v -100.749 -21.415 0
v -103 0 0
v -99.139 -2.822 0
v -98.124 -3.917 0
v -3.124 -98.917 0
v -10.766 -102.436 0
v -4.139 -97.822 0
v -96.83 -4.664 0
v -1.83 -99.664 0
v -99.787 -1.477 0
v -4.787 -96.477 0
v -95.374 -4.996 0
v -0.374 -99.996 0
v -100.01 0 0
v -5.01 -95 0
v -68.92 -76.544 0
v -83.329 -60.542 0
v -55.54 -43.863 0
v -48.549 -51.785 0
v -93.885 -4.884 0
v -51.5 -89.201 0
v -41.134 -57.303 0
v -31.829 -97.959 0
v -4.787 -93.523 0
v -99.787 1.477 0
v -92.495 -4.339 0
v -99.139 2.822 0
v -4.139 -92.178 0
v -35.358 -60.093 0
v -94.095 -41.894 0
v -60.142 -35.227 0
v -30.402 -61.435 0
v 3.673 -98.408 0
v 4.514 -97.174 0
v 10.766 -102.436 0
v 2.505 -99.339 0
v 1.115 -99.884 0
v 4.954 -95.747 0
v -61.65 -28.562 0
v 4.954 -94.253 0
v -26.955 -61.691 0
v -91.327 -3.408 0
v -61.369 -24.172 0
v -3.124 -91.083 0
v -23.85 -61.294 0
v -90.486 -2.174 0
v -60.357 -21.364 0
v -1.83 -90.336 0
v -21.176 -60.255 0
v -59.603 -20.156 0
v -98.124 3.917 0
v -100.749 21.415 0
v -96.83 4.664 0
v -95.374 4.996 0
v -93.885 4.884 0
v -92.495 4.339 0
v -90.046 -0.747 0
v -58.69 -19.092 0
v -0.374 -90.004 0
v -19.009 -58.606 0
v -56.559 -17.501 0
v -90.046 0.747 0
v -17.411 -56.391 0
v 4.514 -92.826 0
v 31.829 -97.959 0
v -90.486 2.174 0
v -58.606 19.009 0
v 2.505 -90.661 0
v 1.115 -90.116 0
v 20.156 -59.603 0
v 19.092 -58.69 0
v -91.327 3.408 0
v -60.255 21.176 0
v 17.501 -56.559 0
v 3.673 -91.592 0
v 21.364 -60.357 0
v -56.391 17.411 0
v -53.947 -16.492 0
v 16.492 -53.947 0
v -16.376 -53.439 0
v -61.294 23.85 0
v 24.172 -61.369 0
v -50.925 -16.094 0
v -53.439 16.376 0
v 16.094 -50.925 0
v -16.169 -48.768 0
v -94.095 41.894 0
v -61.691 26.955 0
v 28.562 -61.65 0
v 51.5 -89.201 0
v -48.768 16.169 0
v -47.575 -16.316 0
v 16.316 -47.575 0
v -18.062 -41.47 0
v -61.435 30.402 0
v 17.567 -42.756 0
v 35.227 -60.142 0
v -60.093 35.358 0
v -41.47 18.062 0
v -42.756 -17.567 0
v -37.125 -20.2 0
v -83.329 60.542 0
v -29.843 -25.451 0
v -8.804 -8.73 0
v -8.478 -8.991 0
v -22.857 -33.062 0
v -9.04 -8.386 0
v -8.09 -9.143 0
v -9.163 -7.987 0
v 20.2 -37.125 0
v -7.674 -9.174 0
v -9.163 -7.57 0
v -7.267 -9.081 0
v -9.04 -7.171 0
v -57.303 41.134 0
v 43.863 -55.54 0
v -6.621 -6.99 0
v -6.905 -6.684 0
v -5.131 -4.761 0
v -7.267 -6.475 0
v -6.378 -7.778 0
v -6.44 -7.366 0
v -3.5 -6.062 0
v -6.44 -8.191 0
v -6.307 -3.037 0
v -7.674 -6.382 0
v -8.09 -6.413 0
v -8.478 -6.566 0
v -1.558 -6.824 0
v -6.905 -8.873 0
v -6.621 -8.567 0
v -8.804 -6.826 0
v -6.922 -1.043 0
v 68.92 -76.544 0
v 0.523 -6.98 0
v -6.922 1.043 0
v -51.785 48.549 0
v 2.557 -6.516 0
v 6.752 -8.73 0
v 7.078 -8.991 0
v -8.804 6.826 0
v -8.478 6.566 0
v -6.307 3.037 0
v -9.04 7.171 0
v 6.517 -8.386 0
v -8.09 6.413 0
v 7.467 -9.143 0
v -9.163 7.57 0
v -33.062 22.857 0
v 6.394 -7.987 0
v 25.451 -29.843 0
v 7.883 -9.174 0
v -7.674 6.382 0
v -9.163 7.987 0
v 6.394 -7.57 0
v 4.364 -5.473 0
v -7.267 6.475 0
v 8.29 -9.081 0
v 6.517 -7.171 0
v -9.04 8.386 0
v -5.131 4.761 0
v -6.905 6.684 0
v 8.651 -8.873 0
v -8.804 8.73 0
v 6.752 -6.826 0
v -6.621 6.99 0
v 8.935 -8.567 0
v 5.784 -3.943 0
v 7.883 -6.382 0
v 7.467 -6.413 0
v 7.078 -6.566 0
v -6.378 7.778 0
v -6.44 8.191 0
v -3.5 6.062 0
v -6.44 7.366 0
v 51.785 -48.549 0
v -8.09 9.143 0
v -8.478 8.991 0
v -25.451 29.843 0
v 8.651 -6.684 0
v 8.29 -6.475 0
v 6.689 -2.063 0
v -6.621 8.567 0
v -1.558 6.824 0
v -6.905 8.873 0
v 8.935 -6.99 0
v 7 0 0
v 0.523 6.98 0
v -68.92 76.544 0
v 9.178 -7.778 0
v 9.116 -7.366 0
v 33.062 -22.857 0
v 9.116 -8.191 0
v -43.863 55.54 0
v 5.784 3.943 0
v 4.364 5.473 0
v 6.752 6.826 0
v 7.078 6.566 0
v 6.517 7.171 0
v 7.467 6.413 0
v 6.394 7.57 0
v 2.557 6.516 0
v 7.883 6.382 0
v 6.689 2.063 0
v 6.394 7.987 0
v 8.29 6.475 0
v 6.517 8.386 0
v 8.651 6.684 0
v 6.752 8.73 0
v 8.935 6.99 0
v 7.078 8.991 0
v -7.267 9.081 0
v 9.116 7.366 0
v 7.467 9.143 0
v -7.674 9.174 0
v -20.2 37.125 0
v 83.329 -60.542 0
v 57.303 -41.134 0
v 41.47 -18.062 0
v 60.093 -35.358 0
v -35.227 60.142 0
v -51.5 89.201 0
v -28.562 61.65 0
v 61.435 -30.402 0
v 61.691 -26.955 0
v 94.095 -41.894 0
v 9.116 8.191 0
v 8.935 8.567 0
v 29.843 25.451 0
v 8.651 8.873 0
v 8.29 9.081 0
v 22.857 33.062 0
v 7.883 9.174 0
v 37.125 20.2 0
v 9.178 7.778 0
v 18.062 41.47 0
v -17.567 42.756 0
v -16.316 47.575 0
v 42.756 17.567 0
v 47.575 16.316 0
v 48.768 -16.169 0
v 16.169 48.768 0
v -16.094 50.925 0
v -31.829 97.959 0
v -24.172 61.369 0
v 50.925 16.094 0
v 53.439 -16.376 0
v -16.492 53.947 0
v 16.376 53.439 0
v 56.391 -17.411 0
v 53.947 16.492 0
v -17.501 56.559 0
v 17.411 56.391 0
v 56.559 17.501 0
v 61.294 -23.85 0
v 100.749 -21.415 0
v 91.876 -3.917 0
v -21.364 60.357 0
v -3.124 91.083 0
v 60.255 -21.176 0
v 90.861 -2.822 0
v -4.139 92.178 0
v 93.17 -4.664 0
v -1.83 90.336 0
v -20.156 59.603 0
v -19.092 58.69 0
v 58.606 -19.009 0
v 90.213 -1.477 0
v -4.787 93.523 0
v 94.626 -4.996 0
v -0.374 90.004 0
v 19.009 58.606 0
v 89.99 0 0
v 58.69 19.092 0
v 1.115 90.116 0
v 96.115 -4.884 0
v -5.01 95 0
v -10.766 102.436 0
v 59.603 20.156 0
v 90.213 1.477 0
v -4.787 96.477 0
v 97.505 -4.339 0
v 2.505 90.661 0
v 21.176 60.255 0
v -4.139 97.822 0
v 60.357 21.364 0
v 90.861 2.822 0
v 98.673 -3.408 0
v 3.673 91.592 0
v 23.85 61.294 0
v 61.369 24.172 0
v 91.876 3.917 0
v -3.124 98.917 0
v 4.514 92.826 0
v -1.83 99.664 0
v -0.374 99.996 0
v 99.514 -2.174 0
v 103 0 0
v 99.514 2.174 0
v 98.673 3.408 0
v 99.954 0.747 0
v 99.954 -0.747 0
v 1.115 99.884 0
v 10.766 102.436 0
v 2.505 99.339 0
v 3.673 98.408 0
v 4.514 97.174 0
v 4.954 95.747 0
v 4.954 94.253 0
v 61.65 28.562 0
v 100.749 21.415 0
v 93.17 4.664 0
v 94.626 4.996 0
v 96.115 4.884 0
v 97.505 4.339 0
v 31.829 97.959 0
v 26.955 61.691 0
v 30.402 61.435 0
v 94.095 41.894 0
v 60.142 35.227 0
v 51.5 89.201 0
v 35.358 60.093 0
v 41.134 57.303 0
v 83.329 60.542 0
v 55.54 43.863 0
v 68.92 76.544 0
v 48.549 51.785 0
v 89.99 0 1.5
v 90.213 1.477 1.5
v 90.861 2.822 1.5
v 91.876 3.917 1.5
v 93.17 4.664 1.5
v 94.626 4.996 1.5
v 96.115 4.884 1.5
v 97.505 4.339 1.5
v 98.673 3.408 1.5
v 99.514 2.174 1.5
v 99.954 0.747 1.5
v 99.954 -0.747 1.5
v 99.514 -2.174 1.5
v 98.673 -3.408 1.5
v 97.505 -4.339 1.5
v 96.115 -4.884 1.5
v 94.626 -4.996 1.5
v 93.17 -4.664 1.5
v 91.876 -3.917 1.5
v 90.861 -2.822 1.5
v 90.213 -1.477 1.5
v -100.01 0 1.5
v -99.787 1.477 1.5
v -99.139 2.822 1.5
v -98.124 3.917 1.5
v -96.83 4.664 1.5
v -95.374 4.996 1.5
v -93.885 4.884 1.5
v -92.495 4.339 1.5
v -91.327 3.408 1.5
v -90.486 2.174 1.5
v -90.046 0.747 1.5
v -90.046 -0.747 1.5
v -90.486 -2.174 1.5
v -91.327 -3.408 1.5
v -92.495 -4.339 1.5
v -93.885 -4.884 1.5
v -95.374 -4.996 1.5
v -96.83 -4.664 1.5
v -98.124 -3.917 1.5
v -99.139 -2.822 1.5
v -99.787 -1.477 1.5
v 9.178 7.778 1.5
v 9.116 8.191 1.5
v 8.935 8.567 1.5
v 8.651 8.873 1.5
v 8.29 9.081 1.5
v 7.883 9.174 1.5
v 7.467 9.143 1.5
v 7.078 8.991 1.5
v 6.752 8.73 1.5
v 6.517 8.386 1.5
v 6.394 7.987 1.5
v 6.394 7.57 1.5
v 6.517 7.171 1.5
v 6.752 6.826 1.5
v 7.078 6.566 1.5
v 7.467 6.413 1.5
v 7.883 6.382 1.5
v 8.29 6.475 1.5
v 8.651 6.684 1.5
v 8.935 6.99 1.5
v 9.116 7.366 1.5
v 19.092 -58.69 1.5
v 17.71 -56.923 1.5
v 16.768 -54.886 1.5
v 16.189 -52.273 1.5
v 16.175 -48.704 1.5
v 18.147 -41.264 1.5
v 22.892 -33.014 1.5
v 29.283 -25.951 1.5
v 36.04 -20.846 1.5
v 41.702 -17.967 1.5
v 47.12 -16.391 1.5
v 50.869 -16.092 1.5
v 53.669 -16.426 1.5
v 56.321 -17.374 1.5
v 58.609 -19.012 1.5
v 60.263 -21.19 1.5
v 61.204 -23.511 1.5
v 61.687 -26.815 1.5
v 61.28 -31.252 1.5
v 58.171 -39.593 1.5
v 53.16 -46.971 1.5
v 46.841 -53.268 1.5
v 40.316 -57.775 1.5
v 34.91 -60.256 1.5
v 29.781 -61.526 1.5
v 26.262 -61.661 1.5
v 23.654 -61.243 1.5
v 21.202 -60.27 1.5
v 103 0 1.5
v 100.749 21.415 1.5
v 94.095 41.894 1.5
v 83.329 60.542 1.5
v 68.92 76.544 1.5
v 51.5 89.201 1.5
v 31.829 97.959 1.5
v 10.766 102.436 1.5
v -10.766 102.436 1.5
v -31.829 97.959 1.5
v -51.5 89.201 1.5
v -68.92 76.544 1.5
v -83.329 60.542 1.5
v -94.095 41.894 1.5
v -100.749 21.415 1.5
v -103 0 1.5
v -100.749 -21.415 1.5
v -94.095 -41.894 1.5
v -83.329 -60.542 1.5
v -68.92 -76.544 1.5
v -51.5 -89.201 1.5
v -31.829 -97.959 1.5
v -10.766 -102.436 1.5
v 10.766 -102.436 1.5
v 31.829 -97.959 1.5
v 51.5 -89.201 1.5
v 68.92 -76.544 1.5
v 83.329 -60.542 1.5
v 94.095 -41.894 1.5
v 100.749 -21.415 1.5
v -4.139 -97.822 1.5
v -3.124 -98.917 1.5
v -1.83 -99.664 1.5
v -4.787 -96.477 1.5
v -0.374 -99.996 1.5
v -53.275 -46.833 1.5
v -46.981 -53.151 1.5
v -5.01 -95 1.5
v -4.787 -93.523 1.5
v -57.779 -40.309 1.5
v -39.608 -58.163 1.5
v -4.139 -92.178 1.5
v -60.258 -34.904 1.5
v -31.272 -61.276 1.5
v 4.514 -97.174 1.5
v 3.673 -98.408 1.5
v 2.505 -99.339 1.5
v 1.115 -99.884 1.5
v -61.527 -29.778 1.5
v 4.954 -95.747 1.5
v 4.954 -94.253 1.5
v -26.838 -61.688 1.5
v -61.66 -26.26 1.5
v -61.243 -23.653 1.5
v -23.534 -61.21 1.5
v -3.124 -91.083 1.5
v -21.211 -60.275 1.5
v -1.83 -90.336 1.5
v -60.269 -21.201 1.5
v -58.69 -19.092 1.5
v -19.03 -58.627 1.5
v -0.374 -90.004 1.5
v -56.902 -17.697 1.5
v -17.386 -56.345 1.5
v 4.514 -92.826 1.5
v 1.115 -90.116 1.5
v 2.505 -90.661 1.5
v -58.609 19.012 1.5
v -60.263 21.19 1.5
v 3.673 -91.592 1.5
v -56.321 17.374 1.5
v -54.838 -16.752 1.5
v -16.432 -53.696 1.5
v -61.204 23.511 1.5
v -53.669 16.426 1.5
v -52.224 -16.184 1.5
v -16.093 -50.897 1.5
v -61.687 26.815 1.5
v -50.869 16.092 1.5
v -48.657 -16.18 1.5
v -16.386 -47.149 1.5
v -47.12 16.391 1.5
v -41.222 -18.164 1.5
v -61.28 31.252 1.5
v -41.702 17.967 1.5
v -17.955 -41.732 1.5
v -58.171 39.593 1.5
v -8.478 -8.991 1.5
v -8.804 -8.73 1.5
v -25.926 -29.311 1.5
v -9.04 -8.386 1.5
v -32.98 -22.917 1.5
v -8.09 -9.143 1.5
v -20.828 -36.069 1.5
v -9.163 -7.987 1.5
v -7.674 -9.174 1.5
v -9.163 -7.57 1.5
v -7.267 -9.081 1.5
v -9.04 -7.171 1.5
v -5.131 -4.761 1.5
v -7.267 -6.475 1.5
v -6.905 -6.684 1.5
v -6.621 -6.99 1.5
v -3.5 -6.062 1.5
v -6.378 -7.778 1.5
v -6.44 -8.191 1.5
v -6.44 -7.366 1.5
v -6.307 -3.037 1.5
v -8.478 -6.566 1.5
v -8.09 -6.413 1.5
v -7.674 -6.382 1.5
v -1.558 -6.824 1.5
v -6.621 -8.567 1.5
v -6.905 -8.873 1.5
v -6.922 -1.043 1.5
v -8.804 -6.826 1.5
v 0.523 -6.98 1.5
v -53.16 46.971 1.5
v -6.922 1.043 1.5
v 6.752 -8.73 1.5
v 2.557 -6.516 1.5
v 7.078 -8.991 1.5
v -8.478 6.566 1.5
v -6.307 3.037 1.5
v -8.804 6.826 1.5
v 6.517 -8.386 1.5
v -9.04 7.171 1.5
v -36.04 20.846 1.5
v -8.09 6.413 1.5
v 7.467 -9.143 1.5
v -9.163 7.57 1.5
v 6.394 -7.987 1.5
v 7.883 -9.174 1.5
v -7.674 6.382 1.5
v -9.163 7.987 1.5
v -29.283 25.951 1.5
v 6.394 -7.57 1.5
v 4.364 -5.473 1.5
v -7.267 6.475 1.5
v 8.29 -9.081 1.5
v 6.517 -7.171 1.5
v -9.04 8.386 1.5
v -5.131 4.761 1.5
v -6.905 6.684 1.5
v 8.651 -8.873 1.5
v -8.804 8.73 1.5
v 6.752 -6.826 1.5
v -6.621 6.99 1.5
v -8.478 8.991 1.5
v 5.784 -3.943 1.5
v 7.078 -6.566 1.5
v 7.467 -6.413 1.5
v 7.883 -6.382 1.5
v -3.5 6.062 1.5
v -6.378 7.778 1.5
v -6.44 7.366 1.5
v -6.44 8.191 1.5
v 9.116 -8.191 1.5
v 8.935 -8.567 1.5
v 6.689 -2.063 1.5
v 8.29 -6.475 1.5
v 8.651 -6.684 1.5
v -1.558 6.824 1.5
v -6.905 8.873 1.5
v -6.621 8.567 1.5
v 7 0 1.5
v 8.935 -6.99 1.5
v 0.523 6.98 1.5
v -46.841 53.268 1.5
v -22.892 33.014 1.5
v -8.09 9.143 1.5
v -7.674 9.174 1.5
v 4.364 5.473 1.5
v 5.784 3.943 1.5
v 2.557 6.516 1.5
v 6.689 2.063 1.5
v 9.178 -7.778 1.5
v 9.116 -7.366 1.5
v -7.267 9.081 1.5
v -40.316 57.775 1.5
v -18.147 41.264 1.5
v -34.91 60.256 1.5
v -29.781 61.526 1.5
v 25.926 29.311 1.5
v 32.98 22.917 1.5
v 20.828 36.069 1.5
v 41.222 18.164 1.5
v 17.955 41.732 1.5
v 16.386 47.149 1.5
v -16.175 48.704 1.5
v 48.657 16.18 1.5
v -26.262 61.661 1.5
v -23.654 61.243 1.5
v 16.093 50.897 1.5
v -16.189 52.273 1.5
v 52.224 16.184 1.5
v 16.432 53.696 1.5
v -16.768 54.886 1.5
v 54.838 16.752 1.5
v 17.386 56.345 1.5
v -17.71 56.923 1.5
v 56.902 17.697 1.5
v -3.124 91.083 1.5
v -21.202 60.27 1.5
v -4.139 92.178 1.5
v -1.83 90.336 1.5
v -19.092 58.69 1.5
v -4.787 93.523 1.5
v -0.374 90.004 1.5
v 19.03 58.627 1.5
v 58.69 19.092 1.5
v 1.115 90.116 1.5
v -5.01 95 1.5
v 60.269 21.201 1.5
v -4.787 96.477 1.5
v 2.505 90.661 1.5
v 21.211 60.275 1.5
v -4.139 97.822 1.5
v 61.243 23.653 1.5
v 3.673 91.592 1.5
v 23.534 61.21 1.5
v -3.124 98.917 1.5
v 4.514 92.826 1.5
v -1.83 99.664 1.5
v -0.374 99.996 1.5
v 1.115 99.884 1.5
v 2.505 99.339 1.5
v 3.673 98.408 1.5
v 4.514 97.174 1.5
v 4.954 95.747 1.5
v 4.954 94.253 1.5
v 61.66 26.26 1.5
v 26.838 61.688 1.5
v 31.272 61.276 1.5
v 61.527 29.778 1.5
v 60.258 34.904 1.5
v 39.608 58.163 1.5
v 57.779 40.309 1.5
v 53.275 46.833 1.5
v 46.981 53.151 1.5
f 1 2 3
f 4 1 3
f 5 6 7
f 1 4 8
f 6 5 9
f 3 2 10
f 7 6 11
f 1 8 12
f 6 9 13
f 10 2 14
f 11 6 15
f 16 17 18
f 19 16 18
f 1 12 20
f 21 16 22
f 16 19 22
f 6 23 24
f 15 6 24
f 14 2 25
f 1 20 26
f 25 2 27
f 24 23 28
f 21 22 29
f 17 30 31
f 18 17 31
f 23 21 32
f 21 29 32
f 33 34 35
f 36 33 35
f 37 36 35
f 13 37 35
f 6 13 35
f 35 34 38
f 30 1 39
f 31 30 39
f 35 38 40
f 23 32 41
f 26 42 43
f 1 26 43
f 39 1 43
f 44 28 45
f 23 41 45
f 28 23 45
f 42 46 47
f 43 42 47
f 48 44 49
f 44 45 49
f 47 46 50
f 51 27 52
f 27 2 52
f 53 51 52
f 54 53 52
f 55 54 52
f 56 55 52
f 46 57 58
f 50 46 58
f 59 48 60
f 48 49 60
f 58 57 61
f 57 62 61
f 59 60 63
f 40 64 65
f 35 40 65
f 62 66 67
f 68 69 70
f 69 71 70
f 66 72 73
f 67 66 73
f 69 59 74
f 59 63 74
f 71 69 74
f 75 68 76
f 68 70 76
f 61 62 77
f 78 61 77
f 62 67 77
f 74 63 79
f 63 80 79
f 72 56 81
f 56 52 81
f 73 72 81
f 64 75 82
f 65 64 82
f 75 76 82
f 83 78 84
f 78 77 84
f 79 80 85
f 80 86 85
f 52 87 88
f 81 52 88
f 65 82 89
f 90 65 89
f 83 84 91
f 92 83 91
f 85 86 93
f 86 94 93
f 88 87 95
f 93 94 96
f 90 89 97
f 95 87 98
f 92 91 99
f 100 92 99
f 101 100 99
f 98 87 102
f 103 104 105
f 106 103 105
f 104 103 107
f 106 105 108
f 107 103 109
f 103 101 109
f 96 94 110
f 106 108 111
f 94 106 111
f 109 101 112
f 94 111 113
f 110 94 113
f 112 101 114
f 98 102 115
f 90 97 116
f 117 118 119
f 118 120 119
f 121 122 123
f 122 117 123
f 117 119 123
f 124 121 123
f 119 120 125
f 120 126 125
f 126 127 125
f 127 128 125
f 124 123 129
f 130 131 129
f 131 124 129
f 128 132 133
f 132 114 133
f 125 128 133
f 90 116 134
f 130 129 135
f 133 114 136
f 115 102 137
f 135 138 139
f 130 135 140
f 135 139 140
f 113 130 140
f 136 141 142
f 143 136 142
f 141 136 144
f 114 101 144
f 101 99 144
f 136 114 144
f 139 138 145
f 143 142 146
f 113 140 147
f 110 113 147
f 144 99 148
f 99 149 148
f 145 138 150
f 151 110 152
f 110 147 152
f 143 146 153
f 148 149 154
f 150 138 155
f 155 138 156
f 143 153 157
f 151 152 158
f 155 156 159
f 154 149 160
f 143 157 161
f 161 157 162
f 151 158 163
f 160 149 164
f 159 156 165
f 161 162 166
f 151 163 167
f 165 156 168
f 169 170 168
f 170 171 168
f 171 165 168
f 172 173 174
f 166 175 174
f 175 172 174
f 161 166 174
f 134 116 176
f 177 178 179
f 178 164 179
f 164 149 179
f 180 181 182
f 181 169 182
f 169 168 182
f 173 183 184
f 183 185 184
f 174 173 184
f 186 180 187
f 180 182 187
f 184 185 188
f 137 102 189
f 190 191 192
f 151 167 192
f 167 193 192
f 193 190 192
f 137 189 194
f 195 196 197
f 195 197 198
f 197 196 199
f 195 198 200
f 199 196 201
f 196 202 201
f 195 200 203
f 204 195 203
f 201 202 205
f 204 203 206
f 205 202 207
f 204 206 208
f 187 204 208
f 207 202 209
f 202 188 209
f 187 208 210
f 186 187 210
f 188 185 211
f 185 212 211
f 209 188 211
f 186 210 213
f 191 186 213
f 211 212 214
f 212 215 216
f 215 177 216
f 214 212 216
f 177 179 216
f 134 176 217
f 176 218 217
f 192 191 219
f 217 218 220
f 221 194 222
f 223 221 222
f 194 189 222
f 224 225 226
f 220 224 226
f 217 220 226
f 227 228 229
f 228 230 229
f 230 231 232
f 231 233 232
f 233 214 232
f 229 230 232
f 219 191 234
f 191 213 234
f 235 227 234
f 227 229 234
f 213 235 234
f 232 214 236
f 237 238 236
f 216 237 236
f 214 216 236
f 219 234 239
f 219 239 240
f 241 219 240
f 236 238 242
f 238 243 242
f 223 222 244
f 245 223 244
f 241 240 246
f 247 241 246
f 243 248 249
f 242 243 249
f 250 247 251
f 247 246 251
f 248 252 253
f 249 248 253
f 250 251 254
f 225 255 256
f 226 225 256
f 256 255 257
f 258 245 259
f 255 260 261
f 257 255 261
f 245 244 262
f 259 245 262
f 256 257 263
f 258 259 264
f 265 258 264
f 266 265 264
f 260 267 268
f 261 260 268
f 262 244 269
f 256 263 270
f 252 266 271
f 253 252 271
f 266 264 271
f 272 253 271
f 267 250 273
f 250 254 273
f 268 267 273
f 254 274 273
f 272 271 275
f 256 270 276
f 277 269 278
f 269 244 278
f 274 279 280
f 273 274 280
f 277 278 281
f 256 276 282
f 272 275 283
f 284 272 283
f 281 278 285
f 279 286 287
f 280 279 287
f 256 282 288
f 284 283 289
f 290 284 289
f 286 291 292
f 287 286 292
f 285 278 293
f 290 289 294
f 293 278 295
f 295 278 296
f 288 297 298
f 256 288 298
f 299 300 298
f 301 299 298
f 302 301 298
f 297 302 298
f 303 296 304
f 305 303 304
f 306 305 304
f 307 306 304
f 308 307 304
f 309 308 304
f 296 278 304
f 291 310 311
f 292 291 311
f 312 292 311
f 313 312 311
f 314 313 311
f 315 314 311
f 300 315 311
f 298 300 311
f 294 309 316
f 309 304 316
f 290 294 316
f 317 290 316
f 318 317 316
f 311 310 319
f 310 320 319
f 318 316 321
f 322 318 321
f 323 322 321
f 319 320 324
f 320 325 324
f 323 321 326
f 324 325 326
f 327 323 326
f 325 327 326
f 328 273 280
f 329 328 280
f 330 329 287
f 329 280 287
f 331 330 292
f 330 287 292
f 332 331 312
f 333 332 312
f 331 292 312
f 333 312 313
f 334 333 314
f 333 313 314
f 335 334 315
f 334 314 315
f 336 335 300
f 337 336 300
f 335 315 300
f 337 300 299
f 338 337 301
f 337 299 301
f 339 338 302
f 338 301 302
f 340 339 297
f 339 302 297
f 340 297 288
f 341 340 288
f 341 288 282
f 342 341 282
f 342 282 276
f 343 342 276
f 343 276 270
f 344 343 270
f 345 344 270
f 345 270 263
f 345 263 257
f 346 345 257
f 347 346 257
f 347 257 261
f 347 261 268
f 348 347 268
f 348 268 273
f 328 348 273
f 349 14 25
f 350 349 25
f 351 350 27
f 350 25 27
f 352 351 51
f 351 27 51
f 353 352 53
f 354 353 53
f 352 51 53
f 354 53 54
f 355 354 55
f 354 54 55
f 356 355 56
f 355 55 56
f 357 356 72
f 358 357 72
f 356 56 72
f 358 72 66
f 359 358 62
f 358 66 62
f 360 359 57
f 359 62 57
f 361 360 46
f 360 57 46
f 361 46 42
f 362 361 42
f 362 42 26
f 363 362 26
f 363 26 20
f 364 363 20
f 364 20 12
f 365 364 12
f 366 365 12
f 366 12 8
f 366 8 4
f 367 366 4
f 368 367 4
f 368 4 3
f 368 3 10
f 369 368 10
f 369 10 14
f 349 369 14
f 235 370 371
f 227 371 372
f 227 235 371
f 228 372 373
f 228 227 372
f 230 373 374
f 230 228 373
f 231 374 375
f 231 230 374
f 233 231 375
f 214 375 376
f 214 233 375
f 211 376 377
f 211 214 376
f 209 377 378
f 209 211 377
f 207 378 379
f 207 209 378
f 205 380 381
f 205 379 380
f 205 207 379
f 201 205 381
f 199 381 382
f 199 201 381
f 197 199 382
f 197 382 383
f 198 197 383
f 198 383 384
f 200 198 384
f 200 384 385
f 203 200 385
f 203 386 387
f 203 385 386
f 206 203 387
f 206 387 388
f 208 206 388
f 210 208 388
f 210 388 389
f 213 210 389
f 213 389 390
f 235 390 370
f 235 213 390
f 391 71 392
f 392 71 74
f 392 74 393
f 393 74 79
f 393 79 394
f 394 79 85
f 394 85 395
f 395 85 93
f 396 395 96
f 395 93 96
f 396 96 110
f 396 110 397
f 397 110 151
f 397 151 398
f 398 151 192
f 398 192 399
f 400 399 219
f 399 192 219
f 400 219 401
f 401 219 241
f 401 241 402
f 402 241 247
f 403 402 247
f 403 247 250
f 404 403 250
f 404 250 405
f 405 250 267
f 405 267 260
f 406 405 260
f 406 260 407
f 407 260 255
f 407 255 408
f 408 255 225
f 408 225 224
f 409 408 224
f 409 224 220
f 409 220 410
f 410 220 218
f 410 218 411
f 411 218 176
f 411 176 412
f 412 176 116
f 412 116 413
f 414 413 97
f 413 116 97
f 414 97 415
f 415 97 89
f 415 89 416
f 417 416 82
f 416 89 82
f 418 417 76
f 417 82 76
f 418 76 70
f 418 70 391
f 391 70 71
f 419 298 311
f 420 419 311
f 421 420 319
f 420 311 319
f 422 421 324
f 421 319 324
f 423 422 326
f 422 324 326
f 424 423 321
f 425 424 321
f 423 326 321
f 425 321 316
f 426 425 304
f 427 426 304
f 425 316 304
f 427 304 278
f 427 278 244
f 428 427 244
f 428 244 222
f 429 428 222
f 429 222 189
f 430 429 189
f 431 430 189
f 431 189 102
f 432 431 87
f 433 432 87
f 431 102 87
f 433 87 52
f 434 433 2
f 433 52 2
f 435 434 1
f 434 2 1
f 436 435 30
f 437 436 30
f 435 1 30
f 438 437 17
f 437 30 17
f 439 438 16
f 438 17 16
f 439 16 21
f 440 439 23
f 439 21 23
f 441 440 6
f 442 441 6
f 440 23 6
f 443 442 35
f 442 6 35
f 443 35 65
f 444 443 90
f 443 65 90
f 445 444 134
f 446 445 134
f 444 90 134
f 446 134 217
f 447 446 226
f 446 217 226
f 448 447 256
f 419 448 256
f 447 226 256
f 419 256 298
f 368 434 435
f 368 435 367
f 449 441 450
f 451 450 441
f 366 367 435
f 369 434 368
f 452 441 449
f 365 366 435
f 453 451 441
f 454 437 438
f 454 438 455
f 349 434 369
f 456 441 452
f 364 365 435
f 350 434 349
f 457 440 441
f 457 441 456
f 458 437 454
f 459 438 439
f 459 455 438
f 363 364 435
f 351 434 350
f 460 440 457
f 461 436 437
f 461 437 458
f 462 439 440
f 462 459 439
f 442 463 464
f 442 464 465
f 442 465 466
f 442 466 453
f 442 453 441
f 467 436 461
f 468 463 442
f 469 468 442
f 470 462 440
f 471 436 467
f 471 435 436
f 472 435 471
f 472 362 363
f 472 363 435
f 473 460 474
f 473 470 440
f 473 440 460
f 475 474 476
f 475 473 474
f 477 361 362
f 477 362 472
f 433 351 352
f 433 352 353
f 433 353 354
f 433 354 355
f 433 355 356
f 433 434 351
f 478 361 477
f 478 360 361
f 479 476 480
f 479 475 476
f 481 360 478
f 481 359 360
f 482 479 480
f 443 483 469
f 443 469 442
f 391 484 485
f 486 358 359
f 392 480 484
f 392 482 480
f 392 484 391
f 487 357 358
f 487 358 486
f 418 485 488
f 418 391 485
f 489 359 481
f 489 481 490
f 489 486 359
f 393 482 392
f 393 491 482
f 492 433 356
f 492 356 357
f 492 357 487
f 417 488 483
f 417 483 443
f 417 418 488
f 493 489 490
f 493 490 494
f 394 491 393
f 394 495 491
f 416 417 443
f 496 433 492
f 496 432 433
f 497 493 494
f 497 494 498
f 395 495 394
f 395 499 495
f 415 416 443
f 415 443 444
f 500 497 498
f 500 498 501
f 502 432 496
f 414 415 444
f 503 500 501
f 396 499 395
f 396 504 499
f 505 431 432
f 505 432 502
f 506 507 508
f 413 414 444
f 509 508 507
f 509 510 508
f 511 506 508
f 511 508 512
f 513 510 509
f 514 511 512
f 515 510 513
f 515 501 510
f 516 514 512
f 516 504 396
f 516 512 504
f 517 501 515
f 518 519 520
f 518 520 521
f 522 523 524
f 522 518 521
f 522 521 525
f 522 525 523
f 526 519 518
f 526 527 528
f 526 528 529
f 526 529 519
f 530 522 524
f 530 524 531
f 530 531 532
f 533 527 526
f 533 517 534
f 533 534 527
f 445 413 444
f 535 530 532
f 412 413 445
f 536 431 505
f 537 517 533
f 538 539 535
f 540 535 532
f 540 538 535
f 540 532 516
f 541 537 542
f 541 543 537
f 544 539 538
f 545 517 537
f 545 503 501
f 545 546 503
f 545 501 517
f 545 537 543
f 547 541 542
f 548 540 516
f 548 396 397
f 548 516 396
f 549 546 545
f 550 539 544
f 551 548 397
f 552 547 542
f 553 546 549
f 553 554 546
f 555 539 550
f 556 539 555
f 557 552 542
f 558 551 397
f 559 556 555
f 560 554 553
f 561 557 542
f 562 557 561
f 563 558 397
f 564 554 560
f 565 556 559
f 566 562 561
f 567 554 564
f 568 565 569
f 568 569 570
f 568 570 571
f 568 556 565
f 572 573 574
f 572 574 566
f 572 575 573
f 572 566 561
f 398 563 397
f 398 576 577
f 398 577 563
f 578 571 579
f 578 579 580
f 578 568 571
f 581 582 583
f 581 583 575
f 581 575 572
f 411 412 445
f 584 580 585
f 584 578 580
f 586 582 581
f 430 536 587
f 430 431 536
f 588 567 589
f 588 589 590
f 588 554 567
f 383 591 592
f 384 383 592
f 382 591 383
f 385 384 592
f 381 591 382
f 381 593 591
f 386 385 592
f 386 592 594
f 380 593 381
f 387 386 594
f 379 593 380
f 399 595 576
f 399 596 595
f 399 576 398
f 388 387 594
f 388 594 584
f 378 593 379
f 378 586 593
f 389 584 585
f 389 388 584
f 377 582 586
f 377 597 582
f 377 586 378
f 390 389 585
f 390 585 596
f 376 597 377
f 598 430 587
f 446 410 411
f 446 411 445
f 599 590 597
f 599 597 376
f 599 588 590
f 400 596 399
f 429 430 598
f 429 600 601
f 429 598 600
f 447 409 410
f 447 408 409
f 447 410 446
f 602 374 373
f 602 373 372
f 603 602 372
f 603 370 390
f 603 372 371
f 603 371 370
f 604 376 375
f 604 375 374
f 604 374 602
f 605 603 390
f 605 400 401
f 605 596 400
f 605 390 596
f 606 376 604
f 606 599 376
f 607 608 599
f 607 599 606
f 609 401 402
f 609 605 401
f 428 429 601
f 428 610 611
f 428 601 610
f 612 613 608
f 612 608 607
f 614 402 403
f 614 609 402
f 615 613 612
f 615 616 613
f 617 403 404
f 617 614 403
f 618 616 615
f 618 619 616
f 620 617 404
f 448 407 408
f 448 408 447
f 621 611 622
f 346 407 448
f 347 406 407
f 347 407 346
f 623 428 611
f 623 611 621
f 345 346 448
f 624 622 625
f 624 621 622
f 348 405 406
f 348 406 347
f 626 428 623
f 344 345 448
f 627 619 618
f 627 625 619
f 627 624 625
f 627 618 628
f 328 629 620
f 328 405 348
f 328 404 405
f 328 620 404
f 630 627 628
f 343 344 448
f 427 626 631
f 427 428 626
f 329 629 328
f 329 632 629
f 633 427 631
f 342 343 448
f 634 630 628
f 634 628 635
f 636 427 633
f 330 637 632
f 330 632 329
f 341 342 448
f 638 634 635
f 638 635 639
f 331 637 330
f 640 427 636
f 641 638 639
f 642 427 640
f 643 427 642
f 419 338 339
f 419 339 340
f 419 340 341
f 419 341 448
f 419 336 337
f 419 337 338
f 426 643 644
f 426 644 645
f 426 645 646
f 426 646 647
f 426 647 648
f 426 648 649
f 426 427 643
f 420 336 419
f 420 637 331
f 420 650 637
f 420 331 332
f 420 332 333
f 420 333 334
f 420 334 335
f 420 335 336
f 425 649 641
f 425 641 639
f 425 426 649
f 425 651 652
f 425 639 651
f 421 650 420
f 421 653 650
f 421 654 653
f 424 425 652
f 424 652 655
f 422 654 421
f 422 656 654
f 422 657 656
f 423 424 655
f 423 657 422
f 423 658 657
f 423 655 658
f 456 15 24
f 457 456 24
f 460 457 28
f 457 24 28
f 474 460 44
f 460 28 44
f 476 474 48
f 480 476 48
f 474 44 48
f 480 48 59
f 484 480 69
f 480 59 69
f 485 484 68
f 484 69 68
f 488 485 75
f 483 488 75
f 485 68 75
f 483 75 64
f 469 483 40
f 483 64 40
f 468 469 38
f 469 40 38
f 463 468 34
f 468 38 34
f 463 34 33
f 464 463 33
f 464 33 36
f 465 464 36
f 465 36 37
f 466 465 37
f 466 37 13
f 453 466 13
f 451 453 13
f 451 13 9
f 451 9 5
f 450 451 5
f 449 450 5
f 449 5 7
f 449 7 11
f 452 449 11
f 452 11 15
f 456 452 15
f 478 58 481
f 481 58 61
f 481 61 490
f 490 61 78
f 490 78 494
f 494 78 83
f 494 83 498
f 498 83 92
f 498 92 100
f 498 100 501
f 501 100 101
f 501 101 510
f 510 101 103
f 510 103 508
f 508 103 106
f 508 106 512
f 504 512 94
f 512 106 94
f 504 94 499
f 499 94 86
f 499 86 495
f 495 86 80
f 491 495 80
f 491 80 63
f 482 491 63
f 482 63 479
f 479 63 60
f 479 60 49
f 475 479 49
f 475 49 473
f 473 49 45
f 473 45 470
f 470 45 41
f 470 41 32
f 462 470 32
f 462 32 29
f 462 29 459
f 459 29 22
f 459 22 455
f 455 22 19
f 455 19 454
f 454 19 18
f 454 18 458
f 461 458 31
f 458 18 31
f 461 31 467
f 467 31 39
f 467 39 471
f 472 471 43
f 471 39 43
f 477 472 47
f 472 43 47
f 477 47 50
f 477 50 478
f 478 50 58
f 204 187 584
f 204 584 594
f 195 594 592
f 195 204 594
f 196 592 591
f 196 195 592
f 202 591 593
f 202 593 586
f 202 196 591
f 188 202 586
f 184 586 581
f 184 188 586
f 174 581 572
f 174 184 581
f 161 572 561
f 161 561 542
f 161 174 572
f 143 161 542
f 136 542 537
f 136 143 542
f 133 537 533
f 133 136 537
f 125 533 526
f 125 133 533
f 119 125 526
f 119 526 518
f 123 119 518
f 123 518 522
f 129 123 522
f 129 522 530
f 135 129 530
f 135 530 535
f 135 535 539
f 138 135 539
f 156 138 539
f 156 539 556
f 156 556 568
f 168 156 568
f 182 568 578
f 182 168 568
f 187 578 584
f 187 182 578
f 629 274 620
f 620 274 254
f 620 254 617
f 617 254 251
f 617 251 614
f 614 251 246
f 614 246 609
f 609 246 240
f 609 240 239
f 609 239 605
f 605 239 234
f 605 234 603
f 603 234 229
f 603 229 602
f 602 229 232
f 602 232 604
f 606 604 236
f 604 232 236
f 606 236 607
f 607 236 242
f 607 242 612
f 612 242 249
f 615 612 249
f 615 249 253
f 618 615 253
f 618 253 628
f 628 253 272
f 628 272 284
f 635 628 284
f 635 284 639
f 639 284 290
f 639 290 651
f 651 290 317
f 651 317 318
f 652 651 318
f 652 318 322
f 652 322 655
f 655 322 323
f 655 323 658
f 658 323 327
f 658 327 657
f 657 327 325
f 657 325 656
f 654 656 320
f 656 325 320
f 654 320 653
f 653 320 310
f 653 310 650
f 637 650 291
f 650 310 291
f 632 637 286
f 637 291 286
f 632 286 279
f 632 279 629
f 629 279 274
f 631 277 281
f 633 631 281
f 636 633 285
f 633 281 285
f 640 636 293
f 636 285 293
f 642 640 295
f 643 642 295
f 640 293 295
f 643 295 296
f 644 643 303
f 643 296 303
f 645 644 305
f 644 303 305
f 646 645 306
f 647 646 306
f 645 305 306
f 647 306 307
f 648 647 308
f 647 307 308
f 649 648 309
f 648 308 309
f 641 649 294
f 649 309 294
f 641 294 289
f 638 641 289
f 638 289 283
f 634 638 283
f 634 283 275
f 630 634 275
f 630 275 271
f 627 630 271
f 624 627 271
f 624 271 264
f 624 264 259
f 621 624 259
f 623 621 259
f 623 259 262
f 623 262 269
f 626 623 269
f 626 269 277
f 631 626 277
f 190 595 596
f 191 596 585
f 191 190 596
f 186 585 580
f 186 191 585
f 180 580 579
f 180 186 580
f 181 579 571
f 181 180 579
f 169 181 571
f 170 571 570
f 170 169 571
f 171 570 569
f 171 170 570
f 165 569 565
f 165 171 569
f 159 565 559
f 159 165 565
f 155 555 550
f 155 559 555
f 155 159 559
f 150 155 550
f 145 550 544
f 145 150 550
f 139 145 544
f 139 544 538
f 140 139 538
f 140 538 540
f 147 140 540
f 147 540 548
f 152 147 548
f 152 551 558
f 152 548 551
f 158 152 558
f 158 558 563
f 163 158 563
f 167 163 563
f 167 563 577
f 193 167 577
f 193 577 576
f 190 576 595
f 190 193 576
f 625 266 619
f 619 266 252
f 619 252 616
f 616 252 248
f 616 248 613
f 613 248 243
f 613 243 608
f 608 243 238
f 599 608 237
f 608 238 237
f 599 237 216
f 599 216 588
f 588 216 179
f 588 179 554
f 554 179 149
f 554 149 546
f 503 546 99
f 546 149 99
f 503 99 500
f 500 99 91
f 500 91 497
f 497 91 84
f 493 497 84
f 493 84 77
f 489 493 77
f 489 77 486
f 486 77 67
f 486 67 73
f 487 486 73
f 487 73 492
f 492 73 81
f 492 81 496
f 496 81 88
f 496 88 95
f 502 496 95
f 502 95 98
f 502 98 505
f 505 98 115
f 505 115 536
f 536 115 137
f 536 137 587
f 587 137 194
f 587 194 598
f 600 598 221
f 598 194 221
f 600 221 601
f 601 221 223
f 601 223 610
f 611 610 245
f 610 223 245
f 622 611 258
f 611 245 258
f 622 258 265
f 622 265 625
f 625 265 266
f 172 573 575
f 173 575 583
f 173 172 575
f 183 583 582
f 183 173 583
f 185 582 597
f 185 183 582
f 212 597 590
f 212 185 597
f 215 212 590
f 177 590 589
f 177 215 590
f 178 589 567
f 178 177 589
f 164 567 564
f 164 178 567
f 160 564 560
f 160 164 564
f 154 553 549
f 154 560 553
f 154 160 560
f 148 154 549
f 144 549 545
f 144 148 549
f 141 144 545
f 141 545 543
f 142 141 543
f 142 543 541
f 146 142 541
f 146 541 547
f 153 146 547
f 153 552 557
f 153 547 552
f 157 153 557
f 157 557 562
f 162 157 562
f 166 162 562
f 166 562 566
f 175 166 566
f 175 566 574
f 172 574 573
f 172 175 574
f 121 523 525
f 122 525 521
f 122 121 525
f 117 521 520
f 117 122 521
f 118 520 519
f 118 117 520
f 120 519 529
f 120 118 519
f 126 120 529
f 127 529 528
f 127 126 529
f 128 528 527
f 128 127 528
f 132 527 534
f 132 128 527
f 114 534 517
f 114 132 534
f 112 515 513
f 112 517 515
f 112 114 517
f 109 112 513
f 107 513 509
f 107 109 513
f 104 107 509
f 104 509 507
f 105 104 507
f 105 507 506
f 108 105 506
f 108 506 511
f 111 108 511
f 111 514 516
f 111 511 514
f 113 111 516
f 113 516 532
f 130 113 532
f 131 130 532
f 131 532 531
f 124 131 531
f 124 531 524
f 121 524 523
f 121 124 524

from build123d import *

# Parameters (mm, degrees)
SKETCH1_R                                      = 103
BASE_DISC_DEPTH                                = 1.5
SKETCH3_R                                      = 3
CUT_EXTRUDE1_DEPTH                             = 146.671719973
SKETCH4_RX                                     = 28
SKETCH4_RY                                     = 16
CUT_EXTRUDE2_DEPTH                             = 146.671719973
SKETCH2_R                                      = 7.5
CUT_EXTRUDE3_DEPTH                             = 146.671720116
CIRPATTERN3_COUNT                              = 4
CIRPATTERN4_COUNT                              = 4
SKETCH5_R                                      = 1.4
CUT_EXTRUDE4_DEPTH                             = 146.671720116
SKETCH6_R                                      = 7.51
SKETCH6_R_2                                    = 7
CENTRE_BORE_CORRECTION_D14_DEPTH               = 1.5
SKETCH7_R                                      = 5.01
REVB_FOUR_CARTRIDGE_PILOT_HOLES_D10P02_R_DEPTH = 146.671720116


with BuildPart() as part:
    # Sketch1 → Base Disc (new body)
    with BuildSketch(Plane.XY):
        Circle(SKETCH1_R)
    extrude(amount=BASE_DISC_DEPTH)

    # Sketch3 → Cut-Extrude1 (cut, through all)
    with BuildSketch(Plane(origin=(0, 0, 0), x_dir=(-1, 0, 0), z_dir=(0, 0, -1))):
        with Locations((95, 0)):
            Circle(SKETCH3_R)
    cut_extrude1 = extrude(amount=-CUT_EXTRUDE1_DEPTH, mode=Mode.SUBTRACT)

    # Sketch4 → Cut-Extrude2 (cut, through all)
    with BuildSketch(Plane(origin=(0, 0, 0), x_dir=(-1, 0, 0), z_dir=(0, 0, -1))):
        with Locations(Location((38.890872965, 38.890872965), (0, 0, 135))):
            Ellipse(SKETCH4_RX, SKETCH4_RY)
    cut_extrude2 = extrude(amount=-CUT_EXTRUDE2_DEPTH, mode=Mode.SUBTRACT)

    # Sketch2 → Cut-Extrude3 (cut, through all)
    with BuildSketch(Plane(origin=(0, 0, 0), x_dir=(-1, 0, 0), z_dir=(0, 0, -1))):
        Circle(SKETCH2_R)
    extrude(amount=-CUT_EXTRUDE3_DEPTH, mode=Mode.SUBTRACT)

    # CirPattern3: Cut-Extrude1 ×4 about axis
    cirpattern3_axis = Axis((0, 0, 0), (0, 0, 1))
    for i in range(1, CIRPATTERN3_COUNT):
        add(cut_extrude1.rotate(cirpattern3_axis, i * 360 / CIRPATTERN3_COUNT), mode=Mode.SUBTRACT)

    # CirPattern4: Cut-Extrude2 ×4 about axis
    cirpattern4_axis = Axis((0, 0, 0), (0, 0, -1))
    for i in range(1, CIRPATTERN4_COUNT):
        add(cut_extrude2.rotate(cirpattern4_axis, i * 360 / CIRPATTERN4_COUNT), mode=Mode.SUBTRACT)

    # Sketch5 → Cut-Extrude4 (cut, through all)
    with BuildSketch(Plane.XY):
        with Locations((-7.778174593, -7.778174593)):
            Circle(SKETCH5_R)
        with Locations((-7.778174593, 7.778174593)):
            Circle(SKETCH5_R)
        with Locations((7.778174593, 7.778174593)):
            Circle(SKETCH5_R)
        with Locations((7.778174593, -7.778174593)):
            Circle(SKETCH5_R)
    extrude(amount=CUT_EXTRUDE4_DEPTH, mode=Mode.SUBTRACT)

    # Sketch6 → Centre_Bore_Correction_D14 (add)
    with BuildSketch(Plane.XY):
        Circle(SKETCH6_R)
        Circle(SKETCH6_R_2, mode=Mode.SUBTRACT)
    extrude(amount=CENTRE_BORE_CORRECTION_D14_DEPTH)

    # Sketch7 → RevB_Four_Cartridge_Pilot_Holes_D10p02_R95 (cut, through all)
    with BuildSketch(Plane(origin=(0, 0, 0), x_dir=(-1, 0, 0), z_dir=(0, 0, -1))):
        with Locations((-95, 0)):
            Circle(SKETCH7_R)
        with Locations((0, 95)):
            Circle(SKETCH7_R)
        with Locations((95, 0)):
            Circle(SKETCH7_R)
        with Locations((0, -95)):
            Circle(SKETCH7_R)
    extrude(amount=-REVB_FOUR_CARTRIDGE_PILOT_HOLES_D10P02_R_DEPTH, mode=Mode.SUBTRACT)


solid = part.part
